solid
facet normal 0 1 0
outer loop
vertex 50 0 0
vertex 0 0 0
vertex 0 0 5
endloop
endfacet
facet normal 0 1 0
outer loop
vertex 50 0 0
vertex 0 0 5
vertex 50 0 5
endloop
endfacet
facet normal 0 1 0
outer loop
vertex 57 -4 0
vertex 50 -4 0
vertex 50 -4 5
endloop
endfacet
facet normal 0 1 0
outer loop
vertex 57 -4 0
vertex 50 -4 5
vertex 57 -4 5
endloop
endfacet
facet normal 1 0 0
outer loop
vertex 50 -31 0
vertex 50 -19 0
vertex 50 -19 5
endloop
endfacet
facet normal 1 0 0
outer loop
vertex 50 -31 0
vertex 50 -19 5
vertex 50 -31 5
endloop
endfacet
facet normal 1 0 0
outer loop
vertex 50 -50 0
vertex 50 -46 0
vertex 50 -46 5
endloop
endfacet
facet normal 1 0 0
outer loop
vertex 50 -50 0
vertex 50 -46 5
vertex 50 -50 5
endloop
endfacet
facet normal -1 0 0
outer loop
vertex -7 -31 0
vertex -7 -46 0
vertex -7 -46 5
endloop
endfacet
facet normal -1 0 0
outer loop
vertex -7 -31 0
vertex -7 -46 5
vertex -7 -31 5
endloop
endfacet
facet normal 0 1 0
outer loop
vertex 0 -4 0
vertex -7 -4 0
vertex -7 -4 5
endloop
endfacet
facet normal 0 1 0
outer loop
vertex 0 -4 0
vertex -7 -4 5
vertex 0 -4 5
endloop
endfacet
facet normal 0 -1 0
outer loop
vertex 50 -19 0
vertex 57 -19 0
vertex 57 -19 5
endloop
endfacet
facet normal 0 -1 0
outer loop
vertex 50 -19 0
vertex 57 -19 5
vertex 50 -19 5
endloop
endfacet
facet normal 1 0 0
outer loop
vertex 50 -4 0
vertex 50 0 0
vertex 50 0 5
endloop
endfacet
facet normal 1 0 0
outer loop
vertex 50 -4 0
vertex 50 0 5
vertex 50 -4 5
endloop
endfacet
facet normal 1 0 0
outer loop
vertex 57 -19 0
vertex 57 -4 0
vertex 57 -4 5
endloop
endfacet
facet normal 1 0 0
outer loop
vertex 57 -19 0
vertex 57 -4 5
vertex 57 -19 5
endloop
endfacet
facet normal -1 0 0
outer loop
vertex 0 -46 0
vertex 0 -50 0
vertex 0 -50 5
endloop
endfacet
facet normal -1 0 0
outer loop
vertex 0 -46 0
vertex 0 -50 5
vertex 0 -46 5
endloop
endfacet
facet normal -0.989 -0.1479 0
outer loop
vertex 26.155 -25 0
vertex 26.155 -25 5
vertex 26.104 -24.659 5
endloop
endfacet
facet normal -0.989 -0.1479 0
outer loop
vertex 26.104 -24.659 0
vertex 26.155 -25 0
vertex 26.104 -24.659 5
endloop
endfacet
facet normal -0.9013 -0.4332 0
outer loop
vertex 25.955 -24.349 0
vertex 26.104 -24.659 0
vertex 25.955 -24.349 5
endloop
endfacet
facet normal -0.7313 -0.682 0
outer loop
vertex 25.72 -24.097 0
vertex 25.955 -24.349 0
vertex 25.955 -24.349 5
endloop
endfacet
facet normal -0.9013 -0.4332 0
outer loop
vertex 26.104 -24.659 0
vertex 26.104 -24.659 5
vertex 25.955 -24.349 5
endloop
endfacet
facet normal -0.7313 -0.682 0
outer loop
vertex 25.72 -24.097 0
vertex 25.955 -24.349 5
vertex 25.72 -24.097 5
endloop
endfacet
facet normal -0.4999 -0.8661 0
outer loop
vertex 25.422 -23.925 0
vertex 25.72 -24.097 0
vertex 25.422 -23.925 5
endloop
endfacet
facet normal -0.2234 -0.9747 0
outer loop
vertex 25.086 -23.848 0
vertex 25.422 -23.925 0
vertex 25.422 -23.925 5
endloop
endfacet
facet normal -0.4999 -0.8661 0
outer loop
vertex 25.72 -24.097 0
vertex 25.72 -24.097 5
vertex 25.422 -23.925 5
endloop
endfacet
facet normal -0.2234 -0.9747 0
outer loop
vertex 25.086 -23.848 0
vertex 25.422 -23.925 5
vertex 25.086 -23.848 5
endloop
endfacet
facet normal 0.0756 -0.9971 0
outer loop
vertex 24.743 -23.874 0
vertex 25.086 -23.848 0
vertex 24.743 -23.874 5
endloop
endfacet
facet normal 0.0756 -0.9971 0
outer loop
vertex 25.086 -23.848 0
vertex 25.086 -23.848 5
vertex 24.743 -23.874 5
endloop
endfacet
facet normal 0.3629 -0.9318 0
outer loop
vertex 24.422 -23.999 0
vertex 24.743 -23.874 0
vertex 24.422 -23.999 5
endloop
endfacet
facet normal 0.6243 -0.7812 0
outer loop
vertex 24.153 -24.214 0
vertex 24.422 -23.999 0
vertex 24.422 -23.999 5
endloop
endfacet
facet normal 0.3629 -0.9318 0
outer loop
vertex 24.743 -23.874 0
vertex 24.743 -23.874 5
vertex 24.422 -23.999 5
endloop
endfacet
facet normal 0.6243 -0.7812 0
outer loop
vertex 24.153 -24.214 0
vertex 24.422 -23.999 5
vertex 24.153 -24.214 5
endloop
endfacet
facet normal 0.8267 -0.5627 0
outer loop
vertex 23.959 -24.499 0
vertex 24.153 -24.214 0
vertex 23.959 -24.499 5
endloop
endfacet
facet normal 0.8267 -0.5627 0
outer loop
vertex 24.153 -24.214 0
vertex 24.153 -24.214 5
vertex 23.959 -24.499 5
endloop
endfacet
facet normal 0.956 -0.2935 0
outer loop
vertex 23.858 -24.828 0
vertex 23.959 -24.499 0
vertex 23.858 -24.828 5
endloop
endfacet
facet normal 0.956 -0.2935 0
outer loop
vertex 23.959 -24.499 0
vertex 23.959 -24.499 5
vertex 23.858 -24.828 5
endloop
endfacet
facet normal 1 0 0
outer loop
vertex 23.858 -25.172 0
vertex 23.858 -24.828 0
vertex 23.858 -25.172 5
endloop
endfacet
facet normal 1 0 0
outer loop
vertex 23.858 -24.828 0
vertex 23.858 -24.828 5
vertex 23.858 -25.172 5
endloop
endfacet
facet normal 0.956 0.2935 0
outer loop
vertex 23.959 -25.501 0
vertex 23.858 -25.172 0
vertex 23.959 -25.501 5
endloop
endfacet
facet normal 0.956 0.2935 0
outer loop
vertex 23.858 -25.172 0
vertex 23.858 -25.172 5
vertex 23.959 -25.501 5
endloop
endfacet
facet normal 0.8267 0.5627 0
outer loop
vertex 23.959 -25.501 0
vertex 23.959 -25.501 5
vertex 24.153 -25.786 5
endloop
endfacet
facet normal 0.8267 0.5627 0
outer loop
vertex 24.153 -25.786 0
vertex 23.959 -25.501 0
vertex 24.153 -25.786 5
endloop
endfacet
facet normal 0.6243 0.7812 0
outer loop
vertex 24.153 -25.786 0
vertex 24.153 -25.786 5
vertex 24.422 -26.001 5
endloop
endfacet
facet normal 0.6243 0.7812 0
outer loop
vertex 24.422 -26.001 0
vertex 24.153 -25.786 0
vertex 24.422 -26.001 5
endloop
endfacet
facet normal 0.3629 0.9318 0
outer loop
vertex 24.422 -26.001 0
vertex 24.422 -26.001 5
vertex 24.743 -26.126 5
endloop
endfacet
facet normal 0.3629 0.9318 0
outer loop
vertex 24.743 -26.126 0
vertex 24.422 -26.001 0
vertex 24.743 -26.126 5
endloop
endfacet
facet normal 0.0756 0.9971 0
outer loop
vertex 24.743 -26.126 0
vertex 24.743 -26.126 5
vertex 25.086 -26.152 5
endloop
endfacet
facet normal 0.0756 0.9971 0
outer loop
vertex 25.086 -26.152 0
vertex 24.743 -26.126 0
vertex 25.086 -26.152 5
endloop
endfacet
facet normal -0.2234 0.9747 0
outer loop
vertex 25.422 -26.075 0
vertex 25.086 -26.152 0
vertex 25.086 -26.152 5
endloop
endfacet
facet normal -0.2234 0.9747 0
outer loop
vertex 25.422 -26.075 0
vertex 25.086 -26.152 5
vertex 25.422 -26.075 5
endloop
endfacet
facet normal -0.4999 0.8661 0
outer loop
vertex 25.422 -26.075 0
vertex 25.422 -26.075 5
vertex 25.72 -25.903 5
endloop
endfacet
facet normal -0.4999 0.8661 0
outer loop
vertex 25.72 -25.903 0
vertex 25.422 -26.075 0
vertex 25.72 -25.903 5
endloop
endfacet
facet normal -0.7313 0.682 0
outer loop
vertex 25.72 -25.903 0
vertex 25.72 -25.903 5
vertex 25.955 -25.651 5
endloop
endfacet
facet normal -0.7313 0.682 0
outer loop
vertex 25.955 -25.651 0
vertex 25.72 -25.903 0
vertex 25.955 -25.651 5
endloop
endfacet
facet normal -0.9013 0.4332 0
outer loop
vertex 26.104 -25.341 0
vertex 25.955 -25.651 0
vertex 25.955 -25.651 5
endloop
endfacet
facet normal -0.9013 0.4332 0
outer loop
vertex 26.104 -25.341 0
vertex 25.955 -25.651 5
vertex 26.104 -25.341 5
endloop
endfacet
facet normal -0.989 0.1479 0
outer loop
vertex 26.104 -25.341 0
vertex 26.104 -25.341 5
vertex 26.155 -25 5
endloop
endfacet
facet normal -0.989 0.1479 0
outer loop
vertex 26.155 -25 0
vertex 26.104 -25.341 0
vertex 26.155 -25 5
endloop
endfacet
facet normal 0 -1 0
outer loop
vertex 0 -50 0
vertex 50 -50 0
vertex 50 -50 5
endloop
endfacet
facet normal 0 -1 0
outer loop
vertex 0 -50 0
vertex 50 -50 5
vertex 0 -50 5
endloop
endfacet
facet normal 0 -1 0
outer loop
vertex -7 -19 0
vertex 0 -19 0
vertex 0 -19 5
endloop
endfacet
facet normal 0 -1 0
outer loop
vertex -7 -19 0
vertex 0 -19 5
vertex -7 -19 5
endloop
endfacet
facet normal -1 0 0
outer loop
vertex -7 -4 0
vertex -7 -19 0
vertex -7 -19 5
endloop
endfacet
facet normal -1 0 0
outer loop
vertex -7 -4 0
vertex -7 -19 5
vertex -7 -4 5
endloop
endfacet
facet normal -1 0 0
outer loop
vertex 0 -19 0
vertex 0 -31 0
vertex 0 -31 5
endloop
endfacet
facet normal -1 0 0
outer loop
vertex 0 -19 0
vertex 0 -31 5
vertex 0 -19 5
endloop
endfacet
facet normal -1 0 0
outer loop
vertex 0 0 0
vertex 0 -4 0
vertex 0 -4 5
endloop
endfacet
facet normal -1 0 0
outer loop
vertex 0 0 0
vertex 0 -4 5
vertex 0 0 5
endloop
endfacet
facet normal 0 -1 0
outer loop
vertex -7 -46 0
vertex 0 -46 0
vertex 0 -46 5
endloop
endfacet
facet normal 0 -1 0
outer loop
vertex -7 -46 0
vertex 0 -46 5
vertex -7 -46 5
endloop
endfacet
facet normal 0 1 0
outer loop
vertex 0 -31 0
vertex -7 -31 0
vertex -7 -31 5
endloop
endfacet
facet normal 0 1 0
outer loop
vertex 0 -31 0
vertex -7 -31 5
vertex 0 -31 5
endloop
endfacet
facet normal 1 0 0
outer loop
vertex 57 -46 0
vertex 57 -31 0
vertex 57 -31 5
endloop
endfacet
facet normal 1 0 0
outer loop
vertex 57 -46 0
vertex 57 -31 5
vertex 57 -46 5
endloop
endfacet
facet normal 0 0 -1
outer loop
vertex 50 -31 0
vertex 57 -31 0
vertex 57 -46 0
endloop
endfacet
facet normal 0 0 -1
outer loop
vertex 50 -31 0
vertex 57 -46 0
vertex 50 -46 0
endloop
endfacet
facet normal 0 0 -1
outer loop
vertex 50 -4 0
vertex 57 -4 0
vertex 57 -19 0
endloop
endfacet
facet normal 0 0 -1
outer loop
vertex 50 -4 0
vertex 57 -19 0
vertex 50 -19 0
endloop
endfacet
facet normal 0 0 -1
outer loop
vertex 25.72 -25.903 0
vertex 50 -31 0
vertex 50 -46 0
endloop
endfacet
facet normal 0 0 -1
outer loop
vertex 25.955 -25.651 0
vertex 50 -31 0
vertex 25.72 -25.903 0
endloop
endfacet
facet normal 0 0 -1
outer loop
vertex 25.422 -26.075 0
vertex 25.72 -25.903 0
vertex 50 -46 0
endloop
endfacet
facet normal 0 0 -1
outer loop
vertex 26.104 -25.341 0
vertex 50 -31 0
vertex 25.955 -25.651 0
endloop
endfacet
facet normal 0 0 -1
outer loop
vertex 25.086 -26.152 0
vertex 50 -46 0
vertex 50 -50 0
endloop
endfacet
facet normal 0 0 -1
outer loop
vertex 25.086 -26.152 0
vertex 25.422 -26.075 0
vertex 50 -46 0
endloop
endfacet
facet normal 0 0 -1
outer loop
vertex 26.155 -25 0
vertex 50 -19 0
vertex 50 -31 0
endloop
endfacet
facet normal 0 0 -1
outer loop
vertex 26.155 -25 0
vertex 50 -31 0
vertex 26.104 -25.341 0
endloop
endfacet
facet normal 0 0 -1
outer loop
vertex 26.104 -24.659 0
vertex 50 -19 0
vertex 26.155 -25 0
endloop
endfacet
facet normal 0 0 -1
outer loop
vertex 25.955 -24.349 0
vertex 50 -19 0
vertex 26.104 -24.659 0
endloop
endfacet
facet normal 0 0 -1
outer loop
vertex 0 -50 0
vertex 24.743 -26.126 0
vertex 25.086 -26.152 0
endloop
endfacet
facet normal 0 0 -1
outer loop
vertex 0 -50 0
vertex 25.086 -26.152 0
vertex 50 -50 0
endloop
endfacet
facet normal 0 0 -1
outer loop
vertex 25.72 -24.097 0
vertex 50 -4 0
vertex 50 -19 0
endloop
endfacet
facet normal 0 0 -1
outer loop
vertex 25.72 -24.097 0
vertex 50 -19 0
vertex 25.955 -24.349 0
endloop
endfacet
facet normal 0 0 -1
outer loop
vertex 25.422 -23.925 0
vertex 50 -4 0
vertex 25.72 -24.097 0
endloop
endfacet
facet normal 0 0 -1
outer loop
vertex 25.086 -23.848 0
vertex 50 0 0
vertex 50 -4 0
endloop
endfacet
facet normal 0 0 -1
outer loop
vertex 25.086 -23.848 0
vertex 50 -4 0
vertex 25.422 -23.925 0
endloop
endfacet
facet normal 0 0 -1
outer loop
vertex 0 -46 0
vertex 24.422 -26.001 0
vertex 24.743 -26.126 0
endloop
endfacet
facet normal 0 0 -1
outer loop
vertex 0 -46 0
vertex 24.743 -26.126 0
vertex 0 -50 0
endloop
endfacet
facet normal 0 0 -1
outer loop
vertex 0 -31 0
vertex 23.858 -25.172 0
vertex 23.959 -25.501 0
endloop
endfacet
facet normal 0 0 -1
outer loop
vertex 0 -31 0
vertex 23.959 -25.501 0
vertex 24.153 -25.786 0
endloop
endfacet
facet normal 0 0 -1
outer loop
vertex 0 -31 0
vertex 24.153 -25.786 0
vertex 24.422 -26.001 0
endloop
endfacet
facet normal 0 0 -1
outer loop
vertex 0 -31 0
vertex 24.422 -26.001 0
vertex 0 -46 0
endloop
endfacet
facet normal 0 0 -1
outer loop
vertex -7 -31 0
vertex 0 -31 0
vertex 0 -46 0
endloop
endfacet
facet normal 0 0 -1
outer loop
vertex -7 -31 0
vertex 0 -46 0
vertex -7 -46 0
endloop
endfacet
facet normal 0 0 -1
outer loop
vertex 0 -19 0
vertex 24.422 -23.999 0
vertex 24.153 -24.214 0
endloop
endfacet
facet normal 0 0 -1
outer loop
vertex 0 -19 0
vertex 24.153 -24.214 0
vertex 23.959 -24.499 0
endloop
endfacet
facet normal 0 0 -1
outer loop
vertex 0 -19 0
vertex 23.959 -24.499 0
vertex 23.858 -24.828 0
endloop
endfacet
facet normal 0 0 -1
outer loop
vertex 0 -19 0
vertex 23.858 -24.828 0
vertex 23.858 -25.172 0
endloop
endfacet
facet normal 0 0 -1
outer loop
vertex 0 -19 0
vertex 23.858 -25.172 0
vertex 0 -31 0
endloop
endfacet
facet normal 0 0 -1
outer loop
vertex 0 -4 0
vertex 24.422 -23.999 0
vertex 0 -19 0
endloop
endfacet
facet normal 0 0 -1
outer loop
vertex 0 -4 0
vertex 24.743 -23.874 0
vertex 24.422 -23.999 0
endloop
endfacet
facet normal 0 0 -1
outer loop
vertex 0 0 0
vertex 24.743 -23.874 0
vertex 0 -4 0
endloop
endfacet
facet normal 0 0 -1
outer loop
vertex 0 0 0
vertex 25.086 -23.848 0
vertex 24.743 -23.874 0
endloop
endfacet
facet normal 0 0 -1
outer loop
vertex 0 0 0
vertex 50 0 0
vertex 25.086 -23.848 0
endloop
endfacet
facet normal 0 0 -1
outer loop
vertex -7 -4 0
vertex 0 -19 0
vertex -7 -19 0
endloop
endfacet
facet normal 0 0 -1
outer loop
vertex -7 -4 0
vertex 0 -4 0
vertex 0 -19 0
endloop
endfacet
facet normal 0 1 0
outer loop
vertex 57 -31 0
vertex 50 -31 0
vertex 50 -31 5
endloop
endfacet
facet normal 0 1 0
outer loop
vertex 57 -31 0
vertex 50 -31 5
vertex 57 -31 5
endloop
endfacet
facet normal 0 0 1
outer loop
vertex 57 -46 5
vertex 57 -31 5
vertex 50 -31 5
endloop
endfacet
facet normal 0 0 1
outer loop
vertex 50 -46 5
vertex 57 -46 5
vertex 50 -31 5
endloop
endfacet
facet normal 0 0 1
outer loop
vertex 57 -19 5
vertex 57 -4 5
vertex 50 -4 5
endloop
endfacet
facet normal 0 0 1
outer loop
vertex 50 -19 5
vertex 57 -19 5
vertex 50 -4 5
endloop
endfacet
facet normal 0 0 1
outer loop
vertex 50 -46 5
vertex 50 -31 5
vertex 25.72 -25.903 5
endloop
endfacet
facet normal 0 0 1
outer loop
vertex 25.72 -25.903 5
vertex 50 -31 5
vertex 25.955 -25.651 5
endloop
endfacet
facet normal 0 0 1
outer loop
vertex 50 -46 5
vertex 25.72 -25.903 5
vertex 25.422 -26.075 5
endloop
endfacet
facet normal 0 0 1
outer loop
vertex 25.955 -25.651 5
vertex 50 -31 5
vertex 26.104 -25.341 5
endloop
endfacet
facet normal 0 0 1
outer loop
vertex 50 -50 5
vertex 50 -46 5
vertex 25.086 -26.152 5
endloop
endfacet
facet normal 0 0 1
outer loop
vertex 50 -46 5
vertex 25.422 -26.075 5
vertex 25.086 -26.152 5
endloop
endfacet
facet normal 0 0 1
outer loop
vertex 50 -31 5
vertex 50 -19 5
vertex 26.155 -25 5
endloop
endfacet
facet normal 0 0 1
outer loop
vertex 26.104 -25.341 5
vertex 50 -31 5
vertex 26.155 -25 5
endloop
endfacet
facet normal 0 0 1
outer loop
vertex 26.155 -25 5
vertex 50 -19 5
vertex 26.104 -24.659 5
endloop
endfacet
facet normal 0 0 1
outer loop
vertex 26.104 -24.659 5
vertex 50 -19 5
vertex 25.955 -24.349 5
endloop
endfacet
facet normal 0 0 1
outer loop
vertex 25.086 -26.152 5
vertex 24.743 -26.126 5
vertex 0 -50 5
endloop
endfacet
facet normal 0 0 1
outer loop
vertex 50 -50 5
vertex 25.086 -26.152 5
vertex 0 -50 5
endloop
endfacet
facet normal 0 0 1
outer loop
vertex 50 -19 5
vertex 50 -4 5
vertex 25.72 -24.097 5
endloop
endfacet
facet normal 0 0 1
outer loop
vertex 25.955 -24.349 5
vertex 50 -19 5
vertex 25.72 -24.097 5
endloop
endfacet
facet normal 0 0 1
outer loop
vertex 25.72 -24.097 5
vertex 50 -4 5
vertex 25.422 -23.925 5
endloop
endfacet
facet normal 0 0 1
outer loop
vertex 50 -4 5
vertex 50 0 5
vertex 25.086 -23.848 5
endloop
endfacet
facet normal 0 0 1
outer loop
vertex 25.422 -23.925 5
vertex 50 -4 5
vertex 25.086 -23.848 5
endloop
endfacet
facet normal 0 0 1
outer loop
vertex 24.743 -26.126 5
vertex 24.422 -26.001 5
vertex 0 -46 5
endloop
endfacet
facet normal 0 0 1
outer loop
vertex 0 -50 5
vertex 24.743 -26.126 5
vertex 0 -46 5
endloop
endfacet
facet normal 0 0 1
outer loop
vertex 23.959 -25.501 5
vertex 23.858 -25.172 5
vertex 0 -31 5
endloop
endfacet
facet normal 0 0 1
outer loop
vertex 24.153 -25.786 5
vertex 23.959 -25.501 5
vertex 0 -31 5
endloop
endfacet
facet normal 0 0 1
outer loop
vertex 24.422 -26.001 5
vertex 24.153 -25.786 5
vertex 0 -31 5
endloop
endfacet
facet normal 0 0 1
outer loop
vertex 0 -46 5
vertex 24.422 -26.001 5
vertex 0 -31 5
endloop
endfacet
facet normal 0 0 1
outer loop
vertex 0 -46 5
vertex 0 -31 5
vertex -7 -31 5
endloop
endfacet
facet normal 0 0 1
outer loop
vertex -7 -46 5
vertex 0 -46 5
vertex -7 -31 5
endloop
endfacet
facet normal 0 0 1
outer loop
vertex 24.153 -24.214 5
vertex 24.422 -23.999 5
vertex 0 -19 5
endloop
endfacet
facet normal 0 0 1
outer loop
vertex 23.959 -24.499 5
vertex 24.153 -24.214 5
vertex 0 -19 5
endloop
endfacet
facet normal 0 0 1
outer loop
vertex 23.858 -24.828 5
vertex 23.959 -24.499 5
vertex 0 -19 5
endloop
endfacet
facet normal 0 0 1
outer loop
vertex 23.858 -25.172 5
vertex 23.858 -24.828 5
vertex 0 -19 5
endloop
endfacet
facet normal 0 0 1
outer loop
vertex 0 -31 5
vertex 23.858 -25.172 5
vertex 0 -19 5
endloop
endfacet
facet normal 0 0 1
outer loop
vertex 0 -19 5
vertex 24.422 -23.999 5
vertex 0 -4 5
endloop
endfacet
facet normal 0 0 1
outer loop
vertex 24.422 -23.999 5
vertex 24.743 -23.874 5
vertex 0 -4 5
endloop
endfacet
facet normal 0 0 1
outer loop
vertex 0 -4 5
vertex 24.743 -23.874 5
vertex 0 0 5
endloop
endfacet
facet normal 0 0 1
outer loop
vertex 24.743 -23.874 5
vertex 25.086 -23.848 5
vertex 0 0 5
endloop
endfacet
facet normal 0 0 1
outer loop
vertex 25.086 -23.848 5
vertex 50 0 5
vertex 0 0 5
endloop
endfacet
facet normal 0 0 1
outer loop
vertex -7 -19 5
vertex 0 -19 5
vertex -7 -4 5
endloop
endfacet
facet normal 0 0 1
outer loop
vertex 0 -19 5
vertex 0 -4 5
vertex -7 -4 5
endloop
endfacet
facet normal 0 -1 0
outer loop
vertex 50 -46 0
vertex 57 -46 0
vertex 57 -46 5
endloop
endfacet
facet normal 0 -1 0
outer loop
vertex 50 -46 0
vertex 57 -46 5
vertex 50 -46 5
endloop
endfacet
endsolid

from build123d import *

# Parameters (mm, degrees)
BOSS_EXTRUDE1_DEPTH = 5
SKETCH2_R           = 1.155281189
CUT_EXTRUDE1_DEPTH  = 10


with BuildPart() as part:
    # Sketch1 → Boss-Extrude1 (new body)
    with BuildSketch(Plane.XY):
        Polygon((0, 0), (50, 0), (50, -4), (57, -4), (57, -19), (50, -19), (50, -31), (57, -31), (57, -46), (50, -46), (50, -50), (0, -50), (0, -46), (-7, -46), (-7, -31), (0, -31), (0, -19), (-7, -19), (-7, -4), (0, -4), align=None)
    extrude(amount=BOSS_EXTRUDE1_DEPTH)

    # Sketch2 → Cut-Extrude1 (cut)
    with BuildSketch(Plane.XY.offset(5)):
        with Locations((25, -25)):
            Circle(SKETCH2_R)
    extrude(amount=-CUT_EXTRUDE1_DEPTH, mode=Mode.SUBTRACT)


solid = part.part
